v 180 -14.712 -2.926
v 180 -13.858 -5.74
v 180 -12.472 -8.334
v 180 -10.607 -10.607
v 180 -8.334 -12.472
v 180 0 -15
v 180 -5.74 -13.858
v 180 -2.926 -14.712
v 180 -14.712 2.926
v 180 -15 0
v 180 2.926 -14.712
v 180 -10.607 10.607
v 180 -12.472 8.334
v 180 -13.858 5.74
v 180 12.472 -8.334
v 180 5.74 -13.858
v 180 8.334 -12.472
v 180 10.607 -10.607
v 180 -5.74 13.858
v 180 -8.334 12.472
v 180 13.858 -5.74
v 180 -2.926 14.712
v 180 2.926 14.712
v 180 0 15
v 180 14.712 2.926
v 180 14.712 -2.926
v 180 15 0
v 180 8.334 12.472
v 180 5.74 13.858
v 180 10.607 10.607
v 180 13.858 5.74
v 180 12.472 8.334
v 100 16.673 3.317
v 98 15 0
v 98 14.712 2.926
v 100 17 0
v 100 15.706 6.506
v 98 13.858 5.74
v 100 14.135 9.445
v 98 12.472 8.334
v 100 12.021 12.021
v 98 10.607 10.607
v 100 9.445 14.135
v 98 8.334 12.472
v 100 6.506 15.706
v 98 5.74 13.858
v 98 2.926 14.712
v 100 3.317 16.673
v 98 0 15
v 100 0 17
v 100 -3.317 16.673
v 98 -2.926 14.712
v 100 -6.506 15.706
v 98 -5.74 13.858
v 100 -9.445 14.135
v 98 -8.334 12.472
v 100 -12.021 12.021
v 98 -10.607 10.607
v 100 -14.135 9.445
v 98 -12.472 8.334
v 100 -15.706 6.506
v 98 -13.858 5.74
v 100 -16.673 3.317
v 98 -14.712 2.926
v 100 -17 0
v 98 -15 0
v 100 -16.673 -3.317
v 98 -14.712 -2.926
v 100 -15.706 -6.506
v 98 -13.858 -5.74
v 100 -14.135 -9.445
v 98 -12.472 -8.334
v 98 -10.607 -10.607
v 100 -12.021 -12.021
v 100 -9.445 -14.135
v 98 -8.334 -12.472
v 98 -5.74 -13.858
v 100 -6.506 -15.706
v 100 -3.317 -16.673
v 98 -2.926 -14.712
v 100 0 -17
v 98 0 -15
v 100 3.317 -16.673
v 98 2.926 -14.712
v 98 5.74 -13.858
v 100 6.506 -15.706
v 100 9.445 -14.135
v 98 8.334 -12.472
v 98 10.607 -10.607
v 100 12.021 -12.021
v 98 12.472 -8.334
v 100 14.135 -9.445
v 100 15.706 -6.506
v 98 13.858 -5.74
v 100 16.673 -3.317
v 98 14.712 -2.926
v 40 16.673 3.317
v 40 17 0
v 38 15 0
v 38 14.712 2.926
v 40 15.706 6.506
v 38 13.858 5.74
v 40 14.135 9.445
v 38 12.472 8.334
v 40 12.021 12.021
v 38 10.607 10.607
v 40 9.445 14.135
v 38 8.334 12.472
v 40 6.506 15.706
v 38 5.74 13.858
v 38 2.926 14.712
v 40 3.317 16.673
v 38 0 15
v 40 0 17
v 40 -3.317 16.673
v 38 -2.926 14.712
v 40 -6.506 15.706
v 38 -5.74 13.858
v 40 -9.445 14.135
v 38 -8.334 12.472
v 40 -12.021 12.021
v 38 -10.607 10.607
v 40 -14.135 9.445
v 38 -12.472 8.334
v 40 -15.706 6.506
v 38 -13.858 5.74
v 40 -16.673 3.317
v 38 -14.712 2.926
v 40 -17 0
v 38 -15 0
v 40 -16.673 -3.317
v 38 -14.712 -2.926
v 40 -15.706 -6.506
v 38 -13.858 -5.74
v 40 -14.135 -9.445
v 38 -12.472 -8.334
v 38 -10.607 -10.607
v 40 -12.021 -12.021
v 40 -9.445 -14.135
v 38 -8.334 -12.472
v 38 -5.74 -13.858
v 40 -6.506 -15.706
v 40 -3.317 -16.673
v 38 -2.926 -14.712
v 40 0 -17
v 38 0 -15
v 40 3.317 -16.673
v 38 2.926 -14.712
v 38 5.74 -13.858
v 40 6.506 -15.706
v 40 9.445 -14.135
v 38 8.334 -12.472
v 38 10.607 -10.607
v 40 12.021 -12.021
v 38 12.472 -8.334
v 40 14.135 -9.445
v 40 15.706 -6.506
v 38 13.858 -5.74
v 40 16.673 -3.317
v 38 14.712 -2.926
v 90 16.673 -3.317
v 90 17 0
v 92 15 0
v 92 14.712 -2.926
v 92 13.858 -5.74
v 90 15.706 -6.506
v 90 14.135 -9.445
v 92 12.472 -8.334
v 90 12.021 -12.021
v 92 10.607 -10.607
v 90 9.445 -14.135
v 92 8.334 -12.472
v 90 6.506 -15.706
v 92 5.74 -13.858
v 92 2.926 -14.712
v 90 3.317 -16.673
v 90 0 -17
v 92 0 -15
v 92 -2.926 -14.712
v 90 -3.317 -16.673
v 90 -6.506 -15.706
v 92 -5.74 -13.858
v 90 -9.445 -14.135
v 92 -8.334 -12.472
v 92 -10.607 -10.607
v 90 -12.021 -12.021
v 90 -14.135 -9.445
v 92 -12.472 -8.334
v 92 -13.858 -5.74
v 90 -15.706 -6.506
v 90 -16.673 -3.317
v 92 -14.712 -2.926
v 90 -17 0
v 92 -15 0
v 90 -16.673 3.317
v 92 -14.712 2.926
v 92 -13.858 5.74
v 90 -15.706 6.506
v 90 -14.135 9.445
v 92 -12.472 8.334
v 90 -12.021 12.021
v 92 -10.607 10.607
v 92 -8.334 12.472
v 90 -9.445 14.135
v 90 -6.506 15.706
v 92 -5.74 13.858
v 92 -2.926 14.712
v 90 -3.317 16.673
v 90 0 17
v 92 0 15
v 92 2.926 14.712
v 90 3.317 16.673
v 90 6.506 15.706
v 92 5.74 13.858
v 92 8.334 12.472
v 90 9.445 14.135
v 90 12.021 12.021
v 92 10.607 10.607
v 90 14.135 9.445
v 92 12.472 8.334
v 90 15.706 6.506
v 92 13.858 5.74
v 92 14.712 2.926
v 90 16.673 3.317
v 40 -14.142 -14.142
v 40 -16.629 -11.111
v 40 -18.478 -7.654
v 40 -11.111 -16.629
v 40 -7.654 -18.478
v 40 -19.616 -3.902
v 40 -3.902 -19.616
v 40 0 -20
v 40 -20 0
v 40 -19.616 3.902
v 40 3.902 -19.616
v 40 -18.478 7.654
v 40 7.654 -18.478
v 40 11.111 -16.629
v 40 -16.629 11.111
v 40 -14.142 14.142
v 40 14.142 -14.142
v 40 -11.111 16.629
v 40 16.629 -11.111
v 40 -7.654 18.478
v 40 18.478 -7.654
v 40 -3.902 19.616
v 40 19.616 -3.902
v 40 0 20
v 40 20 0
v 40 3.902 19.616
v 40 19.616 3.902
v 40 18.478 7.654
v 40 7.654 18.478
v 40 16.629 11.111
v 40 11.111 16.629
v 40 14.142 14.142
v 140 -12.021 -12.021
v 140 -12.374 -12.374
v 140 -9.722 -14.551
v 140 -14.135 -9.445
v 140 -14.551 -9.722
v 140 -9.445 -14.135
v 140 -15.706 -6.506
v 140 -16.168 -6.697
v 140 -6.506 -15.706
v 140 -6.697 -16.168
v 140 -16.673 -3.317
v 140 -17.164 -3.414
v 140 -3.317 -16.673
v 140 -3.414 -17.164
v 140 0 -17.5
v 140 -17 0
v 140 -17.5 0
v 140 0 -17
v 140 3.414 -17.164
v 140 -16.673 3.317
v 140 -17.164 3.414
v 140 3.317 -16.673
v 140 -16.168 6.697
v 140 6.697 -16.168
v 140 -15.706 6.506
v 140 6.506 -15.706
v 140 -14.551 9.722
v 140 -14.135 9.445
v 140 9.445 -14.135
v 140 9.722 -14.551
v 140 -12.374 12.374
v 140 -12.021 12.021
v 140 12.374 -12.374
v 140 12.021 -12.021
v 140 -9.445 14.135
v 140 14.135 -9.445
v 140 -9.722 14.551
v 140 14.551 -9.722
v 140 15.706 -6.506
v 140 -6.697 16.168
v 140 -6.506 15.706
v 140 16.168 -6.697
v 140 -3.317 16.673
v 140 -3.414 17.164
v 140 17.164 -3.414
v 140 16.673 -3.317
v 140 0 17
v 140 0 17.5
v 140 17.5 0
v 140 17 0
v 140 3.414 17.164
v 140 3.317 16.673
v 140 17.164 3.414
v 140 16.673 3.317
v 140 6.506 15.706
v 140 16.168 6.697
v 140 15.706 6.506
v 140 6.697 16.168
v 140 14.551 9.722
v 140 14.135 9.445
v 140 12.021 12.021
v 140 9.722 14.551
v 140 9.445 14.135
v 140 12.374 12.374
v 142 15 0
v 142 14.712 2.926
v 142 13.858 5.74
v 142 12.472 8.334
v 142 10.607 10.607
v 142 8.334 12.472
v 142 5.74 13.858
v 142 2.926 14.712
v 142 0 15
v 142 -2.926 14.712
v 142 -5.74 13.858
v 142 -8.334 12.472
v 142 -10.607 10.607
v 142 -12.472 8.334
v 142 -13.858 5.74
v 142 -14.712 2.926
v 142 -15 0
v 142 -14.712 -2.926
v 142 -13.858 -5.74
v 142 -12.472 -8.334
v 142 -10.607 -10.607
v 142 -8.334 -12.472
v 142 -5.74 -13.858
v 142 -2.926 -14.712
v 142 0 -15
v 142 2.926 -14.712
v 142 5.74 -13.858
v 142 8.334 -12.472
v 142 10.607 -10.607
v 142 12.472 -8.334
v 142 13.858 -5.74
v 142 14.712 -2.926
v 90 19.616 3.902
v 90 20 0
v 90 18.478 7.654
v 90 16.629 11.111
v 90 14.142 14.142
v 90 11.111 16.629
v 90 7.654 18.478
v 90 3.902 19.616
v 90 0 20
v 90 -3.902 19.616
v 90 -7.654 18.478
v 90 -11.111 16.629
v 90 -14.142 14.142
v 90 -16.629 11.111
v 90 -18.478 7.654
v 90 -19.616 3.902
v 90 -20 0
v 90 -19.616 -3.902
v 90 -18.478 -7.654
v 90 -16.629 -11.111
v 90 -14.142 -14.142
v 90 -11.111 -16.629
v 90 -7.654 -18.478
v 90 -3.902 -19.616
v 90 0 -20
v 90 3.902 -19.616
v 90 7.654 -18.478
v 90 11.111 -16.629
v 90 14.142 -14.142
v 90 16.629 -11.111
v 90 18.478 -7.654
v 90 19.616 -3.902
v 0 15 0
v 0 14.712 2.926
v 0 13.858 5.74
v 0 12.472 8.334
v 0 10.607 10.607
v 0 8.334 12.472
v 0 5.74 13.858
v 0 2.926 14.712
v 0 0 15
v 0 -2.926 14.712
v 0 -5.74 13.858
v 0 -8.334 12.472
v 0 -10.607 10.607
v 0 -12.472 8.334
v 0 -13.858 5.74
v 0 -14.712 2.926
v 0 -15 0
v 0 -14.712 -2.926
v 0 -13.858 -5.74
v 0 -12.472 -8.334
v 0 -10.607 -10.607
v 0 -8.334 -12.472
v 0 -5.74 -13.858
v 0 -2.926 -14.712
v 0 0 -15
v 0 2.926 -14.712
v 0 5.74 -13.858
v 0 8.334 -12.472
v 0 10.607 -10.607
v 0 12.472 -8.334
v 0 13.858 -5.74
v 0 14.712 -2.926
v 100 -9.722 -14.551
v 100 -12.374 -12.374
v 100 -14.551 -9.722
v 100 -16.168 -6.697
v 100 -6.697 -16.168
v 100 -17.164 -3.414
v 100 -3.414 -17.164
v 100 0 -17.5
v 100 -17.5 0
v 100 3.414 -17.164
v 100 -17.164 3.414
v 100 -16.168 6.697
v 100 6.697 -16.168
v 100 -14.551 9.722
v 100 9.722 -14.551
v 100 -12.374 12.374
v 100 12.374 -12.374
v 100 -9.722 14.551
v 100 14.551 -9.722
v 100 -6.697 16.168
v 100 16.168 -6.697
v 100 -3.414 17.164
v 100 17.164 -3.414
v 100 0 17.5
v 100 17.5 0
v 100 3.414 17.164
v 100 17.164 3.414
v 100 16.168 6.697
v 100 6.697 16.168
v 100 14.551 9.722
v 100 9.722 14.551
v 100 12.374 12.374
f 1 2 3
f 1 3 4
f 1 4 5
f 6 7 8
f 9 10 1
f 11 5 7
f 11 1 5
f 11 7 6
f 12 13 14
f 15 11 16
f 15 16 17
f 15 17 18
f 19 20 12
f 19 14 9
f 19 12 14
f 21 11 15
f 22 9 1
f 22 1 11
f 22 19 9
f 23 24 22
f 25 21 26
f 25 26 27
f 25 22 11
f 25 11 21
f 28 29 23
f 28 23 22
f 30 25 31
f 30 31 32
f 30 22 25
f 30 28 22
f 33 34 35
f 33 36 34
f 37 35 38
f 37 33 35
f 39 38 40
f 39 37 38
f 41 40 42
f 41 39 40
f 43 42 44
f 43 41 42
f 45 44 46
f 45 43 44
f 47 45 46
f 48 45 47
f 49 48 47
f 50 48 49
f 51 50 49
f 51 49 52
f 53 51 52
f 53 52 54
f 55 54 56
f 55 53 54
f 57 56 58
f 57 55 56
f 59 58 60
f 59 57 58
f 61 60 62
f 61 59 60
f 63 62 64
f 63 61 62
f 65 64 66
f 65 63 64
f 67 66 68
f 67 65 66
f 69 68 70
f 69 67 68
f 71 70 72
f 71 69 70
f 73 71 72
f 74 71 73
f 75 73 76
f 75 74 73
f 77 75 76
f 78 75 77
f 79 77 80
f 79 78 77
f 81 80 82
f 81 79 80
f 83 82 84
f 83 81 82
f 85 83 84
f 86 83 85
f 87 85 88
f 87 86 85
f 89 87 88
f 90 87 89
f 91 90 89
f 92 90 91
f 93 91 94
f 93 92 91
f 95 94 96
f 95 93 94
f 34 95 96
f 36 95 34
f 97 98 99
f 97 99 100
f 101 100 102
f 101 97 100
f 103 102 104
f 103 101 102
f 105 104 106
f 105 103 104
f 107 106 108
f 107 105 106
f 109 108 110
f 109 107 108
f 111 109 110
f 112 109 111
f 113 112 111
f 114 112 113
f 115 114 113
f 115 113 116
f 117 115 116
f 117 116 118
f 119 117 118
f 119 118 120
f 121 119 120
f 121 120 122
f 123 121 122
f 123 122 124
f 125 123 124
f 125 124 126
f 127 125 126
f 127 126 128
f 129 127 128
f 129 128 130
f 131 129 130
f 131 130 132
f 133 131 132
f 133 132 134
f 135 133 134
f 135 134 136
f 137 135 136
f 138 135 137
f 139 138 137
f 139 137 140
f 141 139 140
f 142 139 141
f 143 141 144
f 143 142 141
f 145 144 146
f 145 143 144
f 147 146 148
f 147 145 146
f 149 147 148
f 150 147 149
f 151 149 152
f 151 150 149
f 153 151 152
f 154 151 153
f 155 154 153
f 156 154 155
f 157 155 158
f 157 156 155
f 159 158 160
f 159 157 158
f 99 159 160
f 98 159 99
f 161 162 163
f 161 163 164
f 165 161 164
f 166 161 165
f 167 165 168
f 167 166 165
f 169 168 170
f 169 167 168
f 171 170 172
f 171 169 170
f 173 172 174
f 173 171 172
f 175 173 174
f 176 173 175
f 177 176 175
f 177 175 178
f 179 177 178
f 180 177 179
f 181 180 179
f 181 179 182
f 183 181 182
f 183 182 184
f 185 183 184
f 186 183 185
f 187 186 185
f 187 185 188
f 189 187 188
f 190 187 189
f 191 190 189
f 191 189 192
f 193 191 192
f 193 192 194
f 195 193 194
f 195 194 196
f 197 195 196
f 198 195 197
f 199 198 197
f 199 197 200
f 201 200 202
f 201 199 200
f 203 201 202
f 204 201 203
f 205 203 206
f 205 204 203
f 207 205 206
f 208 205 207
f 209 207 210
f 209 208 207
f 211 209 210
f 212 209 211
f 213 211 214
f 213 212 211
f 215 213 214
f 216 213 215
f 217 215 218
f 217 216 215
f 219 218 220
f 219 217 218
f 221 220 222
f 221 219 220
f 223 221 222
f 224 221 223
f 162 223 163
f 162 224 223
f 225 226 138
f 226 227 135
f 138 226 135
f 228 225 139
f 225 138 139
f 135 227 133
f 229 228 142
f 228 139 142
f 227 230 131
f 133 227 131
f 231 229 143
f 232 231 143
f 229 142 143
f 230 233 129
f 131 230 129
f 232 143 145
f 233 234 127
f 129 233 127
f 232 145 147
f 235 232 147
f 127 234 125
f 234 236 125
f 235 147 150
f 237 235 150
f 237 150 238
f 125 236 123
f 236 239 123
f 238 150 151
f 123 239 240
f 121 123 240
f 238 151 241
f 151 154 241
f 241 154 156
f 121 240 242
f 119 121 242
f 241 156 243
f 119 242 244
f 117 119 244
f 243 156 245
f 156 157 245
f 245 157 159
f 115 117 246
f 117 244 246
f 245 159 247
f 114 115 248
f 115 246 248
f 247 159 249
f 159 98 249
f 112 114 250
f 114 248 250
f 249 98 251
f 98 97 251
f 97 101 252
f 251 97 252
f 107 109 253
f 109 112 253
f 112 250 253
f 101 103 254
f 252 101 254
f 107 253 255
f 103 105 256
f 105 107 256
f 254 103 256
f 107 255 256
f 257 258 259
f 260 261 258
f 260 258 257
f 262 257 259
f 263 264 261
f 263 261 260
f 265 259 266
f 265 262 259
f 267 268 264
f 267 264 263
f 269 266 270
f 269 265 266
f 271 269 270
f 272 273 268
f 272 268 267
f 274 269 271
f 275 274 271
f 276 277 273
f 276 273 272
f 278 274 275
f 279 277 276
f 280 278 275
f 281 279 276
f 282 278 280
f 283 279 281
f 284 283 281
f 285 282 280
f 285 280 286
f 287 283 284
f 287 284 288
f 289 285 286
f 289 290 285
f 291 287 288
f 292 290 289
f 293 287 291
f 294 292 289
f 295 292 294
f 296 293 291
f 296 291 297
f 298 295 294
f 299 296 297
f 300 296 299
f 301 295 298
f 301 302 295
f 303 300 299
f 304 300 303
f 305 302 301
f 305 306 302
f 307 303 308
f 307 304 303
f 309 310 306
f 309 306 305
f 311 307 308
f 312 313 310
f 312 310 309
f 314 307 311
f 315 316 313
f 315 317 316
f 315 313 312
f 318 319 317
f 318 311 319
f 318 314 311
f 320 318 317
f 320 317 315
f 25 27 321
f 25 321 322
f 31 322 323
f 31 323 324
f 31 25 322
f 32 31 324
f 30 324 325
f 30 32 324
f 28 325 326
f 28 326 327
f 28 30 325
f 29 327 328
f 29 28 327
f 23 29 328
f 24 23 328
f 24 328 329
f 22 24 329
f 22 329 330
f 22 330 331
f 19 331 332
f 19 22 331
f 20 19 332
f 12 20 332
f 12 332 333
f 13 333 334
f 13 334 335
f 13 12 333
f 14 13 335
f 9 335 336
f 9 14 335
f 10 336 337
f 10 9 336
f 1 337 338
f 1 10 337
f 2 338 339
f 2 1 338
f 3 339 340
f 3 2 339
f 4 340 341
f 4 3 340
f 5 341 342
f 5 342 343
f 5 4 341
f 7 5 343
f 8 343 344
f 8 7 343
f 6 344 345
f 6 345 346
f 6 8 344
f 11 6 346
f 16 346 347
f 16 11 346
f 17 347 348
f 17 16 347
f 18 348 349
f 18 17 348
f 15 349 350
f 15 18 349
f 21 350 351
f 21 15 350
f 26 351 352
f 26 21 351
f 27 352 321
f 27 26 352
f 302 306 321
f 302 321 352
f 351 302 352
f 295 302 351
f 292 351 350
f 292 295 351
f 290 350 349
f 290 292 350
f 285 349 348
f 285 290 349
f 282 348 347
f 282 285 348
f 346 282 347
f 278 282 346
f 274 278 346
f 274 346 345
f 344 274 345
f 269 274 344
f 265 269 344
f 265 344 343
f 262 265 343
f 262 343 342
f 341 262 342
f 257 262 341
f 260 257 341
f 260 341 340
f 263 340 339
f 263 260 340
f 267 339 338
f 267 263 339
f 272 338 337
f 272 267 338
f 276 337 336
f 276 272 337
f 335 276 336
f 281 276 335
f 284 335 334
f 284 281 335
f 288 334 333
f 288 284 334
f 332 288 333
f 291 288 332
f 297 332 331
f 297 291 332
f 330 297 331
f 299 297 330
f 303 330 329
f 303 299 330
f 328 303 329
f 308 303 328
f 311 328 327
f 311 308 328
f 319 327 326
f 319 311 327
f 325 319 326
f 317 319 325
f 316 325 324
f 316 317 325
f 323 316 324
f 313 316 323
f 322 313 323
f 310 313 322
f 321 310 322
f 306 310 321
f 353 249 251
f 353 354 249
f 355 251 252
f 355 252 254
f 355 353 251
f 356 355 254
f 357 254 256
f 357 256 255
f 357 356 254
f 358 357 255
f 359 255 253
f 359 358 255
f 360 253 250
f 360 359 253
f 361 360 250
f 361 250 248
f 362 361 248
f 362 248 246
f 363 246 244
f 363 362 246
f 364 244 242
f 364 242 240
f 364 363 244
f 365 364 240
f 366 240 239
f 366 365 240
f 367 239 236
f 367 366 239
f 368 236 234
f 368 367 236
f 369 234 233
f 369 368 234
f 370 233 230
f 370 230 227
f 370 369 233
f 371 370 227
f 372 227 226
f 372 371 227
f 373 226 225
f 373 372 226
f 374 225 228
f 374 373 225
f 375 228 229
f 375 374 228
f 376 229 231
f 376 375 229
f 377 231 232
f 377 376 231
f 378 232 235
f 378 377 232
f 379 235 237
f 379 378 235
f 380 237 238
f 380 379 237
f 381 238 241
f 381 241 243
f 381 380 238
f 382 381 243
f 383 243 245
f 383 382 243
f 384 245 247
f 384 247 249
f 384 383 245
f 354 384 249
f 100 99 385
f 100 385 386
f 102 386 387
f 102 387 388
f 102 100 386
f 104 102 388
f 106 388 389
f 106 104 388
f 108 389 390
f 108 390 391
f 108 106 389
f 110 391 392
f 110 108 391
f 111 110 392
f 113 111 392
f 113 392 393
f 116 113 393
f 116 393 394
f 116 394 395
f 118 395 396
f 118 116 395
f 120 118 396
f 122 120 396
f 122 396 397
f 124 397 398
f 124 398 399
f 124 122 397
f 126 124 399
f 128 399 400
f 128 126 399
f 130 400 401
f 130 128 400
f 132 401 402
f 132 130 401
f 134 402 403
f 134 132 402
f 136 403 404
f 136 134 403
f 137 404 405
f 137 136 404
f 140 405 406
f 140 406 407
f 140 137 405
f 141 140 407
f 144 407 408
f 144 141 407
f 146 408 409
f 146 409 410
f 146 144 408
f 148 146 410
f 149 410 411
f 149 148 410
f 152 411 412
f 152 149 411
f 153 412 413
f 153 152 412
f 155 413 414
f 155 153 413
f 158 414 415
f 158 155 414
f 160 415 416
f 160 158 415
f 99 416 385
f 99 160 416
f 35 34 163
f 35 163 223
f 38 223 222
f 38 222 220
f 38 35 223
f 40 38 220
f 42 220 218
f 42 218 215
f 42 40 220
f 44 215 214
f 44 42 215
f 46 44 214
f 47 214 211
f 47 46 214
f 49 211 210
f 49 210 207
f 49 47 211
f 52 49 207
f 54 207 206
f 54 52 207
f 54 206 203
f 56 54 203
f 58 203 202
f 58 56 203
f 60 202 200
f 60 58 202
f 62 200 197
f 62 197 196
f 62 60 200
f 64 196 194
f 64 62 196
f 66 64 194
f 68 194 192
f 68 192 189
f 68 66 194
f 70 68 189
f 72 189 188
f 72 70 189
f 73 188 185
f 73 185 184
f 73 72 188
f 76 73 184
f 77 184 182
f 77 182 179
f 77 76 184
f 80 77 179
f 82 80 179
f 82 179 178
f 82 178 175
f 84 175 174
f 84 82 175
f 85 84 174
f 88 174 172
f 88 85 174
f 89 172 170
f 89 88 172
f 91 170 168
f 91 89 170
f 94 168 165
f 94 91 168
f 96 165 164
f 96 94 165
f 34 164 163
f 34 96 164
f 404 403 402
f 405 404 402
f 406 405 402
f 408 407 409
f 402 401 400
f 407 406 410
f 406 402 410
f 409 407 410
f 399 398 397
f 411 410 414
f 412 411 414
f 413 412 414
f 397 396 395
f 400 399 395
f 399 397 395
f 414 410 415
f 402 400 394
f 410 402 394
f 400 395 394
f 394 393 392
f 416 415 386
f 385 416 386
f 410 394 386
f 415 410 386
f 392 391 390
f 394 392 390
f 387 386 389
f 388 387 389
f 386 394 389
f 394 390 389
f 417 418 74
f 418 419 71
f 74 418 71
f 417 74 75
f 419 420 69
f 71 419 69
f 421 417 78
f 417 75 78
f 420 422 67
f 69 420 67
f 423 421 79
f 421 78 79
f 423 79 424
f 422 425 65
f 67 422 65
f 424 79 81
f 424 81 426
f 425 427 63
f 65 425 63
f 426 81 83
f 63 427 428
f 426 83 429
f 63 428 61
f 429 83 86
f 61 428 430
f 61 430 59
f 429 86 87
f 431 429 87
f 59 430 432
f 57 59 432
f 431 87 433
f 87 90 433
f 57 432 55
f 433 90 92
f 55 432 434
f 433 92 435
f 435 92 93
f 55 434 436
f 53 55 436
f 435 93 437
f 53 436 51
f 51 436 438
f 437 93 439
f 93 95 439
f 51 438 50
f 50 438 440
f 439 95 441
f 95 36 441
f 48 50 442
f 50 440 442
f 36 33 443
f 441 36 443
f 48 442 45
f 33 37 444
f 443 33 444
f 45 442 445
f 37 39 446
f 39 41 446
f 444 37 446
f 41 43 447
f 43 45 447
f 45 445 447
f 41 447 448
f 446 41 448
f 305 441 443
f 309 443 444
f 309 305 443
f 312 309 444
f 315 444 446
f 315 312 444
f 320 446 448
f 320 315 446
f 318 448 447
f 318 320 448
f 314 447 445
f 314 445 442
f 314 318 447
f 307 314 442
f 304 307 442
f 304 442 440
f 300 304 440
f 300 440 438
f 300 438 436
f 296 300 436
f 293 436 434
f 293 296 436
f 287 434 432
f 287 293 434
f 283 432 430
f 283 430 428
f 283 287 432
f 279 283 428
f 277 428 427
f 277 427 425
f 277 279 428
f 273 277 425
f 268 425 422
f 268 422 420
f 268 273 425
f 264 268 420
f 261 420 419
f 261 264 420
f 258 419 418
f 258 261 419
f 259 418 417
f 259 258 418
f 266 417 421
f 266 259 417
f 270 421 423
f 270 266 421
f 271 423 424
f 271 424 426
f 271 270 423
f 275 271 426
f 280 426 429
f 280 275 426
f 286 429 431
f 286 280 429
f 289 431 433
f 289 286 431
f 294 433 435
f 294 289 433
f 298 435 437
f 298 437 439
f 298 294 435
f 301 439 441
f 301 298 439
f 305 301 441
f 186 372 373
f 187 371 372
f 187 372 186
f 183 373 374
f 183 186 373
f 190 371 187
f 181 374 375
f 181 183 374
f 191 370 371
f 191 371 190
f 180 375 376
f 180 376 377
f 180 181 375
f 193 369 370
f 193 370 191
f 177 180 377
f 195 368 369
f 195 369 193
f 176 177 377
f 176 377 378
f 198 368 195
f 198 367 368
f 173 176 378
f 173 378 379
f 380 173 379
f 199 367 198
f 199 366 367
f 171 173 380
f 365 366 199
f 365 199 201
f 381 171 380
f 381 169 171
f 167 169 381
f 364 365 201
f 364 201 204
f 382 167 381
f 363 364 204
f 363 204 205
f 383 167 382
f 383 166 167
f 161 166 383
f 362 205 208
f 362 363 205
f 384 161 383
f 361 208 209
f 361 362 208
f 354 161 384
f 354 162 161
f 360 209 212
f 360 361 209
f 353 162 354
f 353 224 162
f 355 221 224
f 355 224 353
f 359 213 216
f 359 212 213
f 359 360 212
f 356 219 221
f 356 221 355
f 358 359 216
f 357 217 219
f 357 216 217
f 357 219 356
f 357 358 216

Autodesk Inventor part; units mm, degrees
ref_plane "Start Plane" through (0, 0, 0) normal (1, 0, 0) x (0, 1, 0)
ref_plane "XZ Plane" through (0, 0, 0) normal (0, 1, 0) x (-1, 0, 0)
ref_plane "XY Plane" through (0, 0, 0) normal (0, 0, 1) x (1, 0, 0)
sketch "Main Sketch" plane through (0, 0, 0) normal (0, 0, 1) x (1, 0, 0)
  line L0 (0, 0) -> (180, 0)
  line L1 (0, 0) -> (0, 15)
  line L2 (0, 15) -> (40, 15)
  line L3 (40, 15) -> (40, 20)
  line L4 (90, 20) -> (90, 15)
  line L5 (40, 20) -> (90, 20)
  line L6 (90, 15) -> (100, 15)
  line L7 (100, 15) -> (100, 17.5)
  line L8 (140, 17.5) -> (140, 15)
  line L9 (100, 17.5) -> (140, 17.5)
  line L10 (180, 15) -> (180, 0)
  line L11 (140, 15) -> (180, 15)
  dimension "d3" = 30
  dimension "d4" = 40
  dimension "d5" = 30
  dimension "d6" = 35
  dimension "d7" = 30
revolve "Revolution1" add sketch "Main Sketch" angle 360 about axis through (0, 0, 0) along (1, 0, 0)
chamfer "Chamfer1" distance 2 angle 45 1 edges at (40, -15, 0) measured on face at (26.6667, 14.8058, -2.4062)
chamfer "Chamfer2" distance 2 angle 45 1 edges at (90, -15, 0) measured on face at (96.6667, 14.8058, -2.4062)
chamfer "Chamfer3" distance 2 angle 45 1 edges at (100, -15, 0) measured on face at (97.3333, 14.9514, -1.207)
chamfer "Chamfer4" distance 2 angle 45 1 edges at (140, -15, 0) measured on face at (166.6667, 14.8058, -2.4062)
equation "\"Length\" = 180"
properties part number "Shaft" material "Steel"
